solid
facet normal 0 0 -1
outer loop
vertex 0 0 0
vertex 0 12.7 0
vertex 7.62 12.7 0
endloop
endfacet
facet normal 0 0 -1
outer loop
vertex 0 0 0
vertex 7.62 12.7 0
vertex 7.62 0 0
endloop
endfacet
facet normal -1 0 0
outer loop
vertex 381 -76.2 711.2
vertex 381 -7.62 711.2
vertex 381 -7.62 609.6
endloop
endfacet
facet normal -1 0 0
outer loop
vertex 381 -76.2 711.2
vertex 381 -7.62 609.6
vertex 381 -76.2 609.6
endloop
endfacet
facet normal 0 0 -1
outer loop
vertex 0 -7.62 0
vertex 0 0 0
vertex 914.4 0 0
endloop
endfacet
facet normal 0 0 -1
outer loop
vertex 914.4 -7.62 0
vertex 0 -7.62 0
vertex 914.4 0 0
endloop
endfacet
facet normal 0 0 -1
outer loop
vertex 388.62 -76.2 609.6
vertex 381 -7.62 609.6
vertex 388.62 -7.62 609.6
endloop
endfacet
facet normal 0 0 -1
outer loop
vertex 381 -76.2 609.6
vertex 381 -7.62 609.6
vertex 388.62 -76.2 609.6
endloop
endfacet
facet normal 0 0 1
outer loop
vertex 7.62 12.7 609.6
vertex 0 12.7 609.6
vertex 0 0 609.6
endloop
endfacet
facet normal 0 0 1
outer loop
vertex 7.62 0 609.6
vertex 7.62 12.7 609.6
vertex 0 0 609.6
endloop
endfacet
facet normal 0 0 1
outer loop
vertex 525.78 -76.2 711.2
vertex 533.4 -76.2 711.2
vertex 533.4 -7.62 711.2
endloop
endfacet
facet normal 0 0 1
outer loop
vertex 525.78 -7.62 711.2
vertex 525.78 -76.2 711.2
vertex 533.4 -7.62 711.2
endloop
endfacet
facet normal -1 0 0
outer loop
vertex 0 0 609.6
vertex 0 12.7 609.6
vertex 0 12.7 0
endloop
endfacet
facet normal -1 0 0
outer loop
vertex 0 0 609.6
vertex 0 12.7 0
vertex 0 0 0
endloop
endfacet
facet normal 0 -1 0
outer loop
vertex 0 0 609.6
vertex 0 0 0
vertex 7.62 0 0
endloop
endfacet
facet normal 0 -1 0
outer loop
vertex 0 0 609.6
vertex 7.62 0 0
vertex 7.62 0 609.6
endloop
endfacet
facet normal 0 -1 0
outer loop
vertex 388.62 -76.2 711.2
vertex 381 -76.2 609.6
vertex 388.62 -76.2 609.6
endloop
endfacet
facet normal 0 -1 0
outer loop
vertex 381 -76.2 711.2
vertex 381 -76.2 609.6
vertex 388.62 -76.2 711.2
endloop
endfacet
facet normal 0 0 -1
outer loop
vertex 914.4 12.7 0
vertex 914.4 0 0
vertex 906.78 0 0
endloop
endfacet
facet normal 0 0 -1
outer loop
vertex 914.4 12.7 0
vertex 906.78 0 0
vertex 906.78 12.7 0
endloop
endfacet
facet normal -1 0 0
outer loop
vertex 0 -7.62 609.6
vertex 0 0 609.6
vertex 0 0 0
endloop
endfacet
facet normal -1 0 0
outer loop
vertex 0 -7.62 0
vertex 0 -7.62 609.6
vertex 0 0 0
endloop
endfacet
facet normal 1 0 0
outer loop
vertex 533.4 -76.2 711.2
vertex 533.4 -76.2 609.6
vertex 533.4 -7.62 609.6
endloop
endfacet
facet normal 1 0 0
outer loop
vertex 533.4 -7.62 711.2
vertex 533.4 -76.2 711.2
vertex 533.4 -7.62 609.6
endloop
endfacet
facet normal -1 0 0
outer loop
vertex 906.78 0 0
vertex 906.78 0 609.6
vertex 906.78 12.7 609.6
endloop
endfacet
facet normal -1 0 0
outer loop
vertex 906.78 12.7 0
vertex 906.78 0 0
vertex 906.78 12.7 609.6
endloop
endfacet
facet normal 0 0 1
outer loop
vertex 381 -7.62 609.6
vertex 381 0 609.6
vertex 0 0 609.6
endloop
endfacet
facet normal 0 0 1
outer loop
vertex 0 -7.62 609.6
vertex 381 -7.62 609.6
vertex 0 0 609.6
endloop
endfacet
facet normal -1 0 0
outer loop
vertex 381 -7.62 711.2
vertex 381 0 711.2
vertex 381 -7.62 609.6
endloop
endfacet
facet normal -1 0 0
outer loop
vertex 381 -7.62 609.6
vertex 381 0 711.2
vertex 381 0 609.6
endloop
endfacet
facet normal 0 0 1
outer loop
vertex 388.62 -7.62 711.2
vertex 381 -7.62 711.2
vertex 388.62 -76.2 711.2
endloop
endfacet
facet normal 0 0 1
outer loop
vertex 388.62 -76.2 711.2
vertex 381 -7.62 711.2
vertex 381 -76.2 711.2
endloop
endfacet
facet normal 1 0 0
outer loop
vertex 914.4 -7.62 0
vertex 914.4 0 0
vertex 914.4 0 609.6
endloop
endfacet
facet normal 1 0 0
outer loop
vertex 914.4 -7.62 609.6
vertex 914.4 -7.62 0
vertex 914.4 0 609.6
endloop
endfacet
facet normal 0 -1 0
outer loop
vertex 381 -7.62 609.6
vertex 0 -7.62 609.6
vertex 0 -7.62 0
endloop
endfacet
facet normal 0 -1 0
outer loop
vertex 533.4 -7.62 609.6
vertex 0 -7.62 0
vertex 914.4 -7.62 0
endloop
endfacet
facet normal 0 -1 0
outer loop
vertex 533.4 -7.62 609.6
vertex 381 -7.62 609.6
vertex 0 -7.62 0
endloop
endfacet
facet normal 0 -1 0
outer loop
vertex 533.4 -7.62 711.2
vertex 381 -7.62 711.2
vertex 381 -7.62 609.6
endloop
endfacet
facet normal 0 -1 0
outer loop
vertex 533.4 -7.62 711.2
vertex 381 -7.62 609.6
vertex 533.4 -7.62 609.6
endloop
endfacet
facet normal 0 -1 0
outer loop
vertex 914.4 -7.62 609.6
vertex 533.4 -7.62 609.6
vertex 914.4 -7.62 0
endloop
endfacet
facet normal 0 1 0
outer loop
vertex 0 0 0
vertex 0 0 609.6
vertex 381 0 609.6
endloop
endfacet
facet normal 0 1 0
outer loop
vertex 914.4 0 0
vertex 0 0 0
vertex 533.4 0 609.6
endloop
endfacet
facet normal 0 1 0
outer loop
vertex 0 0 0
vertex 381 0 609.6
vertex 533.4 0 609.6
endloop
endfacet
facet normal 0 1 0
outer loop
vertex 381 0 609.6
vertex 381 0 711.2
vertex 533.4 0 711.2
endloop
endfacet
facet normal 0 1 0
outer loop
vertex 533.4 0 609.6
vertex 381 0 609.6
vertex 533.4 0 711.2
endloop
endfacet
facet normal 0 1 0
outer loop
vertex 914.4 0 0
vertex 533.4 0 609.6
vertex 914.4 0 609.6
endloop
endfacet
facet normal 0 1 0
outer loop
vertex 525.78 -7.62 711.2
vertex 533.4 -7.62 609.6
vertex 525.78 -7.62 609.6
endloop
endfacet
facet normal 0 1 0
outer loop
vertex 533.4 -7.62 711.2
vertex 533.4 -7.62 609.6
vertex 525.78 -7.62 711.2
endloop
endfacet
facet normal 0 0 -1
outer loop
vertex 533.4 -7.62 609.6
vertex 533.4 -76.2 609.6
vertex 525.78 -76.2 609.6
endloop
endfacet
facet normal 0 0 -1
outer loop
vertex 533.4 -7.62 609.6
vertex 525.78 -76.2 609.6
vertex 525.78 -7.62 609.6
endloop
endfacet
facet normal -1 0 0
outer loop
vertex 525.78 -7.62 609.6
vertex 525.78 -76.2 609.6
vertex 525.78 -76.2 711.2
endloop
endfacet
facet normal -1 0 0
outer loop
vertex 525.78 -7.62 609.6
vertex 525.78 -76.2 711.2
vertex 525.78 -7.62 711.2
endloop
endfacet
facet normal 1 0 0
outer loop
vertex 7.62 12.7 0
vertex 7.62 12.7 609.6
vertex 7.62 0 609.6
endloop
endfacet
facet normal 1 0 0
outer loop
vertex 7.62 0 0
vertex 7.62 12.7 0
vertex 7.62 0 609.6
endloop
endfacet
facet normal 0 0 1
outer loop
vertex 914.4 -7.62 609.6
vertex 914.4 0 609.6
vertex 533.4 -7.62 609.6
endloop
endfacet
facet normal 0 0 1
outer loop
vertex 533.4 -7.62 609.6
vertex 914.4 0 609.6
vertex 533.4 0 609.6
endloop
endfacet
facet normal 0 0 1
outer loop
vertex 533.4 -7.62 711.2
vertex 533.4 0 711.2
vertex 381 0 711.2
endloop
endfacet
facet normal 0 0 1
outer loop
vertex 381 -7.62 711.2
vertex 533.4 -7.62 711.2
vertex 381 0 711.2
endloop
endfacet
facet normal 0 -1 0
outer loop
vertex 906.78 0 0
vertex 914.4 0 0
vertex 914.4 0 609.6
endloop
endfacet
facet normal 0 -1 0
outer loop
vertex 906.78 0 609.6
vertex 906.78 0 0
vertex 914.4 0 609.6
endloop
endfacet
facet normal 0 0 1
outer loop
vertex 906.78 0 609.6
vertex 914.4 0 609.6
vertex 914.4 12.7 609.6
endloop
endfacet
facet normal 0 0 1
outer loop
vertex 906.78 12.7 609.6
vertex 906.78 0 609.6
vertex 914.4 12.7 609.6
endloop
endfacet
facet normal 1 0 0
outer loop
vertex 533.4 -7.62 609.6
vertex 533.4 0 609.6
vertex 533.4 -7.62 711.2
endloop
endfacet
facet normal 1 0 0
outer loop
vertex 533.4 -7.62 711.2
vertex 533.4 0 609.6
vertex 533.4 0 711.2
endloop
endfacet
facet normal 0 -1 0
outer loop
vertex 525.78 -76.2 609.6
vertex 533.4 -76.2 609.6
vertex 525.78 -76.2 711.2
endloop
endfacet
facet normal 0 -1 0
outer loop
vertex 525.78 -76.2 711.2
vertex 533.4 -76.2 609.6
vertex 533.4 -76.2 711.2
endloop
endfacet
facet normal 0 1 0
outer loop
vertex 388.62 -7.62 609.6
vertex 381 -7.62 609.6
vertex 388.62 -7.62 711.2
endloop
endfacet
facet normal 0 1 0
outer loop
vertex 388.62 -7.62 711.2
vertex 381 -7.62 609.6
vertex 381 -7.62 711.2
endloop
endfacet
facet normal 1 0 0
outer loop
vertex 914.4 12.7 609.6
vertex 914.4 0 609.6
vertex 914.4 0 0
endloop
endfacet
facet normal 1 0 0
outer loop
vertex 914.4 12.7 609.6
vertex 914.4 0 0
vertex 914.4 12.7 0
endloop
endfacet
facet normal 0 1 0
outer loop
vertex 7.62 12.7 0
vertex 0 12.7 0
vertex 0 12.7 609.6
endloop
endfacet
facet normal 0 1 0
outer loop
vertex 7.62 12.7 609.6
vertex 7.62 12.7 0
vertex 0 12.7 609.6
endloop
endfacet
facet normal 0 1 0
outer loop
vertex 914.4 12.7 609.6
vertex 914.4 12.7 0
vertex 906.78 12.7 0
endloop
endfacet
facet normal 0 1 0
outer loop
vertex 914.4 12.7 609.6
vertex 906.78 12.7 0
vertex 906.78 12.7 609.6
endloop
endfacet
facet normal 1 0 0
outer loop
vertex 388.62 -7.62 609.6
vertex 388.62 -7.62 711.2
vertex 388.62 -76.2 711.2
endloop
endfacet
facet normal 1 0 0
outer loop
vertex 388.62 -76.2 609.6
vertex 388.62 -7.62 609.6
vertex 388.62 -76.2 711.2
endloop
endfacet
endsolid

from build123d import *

# Parameters (mm, degrees)
F1_DEPTH = 7.62
F2_W     = 68.58
F2_H     = 101.6
F3_DEPTH = 7.62
F4_W     = 68.58
F4_H     = 101.6
F5_DEPTH = 7.62
F6_W     = 12.7
F6_H     = 609.6
F7_DEPTH = 7.62
F8_W     = 12.7
F8_H     = 609.6
F9_DEPTH = 7.62


with BuildPart() as f1:
    # F0 (on Front) → F1 (new body)
    with BuildSketch(Plane.XZ):
        Polygon((0, 609.6), (0, 0), (914.4, 0), (914.4, 609.6), (533.4, 609.6), (533.4, 711.2), (381, 711.2), (381, 609.6), align=None)
    extrude(amount=F1_DEPTH)


with BuildPart() as f3:
    # F2 (on face) → F3 (new body)
    with BuildSketch(Plane(origin=(381, 0, 0), x_dir=(0, -1, 0), z_dir=(-1, 0, 0))):
        with Locations((41.91, 660.4)):
            Rectangle(F2_W, F2_H)
    extrude(amount=-F3_DEPTH)


with BuildPart() as f5:
    # F4 (on face) → F5 (new body)
    with BuildSketch(Plane.YZ.offset(533.4)):
        with Locations((-41.91, 660.4)):
            Rectangle(F4_W, F4_H)
    extrude(amount=-F5_DEPTH)


with BuildPart() as f7:
    # F6 (on face) → F7 (new body)
    with BuildSketch(Plane.YZ.offset(914.4)):
        with Locations((6.35, 304.8)):
            Rectangle(F6_W, F6_H)
    extrude(amount=-F7_DEPTH)


with BuildPart() as f9:
    # F8 (on face) → F9 (new body)
    with BuildSketch(Plane(origin=(0, 0, 0), x_dir=(0, -1, 0), z_dir=(-1, 0, 0))):
        with Locations((-6.35, 304.8)):
            Rectangle(F8_W, F8_H)
    extrude(amount=-F9_DEPTH)


solid = Compound([f1.part, f3.part, f5.part, f7.part, f9.part])
